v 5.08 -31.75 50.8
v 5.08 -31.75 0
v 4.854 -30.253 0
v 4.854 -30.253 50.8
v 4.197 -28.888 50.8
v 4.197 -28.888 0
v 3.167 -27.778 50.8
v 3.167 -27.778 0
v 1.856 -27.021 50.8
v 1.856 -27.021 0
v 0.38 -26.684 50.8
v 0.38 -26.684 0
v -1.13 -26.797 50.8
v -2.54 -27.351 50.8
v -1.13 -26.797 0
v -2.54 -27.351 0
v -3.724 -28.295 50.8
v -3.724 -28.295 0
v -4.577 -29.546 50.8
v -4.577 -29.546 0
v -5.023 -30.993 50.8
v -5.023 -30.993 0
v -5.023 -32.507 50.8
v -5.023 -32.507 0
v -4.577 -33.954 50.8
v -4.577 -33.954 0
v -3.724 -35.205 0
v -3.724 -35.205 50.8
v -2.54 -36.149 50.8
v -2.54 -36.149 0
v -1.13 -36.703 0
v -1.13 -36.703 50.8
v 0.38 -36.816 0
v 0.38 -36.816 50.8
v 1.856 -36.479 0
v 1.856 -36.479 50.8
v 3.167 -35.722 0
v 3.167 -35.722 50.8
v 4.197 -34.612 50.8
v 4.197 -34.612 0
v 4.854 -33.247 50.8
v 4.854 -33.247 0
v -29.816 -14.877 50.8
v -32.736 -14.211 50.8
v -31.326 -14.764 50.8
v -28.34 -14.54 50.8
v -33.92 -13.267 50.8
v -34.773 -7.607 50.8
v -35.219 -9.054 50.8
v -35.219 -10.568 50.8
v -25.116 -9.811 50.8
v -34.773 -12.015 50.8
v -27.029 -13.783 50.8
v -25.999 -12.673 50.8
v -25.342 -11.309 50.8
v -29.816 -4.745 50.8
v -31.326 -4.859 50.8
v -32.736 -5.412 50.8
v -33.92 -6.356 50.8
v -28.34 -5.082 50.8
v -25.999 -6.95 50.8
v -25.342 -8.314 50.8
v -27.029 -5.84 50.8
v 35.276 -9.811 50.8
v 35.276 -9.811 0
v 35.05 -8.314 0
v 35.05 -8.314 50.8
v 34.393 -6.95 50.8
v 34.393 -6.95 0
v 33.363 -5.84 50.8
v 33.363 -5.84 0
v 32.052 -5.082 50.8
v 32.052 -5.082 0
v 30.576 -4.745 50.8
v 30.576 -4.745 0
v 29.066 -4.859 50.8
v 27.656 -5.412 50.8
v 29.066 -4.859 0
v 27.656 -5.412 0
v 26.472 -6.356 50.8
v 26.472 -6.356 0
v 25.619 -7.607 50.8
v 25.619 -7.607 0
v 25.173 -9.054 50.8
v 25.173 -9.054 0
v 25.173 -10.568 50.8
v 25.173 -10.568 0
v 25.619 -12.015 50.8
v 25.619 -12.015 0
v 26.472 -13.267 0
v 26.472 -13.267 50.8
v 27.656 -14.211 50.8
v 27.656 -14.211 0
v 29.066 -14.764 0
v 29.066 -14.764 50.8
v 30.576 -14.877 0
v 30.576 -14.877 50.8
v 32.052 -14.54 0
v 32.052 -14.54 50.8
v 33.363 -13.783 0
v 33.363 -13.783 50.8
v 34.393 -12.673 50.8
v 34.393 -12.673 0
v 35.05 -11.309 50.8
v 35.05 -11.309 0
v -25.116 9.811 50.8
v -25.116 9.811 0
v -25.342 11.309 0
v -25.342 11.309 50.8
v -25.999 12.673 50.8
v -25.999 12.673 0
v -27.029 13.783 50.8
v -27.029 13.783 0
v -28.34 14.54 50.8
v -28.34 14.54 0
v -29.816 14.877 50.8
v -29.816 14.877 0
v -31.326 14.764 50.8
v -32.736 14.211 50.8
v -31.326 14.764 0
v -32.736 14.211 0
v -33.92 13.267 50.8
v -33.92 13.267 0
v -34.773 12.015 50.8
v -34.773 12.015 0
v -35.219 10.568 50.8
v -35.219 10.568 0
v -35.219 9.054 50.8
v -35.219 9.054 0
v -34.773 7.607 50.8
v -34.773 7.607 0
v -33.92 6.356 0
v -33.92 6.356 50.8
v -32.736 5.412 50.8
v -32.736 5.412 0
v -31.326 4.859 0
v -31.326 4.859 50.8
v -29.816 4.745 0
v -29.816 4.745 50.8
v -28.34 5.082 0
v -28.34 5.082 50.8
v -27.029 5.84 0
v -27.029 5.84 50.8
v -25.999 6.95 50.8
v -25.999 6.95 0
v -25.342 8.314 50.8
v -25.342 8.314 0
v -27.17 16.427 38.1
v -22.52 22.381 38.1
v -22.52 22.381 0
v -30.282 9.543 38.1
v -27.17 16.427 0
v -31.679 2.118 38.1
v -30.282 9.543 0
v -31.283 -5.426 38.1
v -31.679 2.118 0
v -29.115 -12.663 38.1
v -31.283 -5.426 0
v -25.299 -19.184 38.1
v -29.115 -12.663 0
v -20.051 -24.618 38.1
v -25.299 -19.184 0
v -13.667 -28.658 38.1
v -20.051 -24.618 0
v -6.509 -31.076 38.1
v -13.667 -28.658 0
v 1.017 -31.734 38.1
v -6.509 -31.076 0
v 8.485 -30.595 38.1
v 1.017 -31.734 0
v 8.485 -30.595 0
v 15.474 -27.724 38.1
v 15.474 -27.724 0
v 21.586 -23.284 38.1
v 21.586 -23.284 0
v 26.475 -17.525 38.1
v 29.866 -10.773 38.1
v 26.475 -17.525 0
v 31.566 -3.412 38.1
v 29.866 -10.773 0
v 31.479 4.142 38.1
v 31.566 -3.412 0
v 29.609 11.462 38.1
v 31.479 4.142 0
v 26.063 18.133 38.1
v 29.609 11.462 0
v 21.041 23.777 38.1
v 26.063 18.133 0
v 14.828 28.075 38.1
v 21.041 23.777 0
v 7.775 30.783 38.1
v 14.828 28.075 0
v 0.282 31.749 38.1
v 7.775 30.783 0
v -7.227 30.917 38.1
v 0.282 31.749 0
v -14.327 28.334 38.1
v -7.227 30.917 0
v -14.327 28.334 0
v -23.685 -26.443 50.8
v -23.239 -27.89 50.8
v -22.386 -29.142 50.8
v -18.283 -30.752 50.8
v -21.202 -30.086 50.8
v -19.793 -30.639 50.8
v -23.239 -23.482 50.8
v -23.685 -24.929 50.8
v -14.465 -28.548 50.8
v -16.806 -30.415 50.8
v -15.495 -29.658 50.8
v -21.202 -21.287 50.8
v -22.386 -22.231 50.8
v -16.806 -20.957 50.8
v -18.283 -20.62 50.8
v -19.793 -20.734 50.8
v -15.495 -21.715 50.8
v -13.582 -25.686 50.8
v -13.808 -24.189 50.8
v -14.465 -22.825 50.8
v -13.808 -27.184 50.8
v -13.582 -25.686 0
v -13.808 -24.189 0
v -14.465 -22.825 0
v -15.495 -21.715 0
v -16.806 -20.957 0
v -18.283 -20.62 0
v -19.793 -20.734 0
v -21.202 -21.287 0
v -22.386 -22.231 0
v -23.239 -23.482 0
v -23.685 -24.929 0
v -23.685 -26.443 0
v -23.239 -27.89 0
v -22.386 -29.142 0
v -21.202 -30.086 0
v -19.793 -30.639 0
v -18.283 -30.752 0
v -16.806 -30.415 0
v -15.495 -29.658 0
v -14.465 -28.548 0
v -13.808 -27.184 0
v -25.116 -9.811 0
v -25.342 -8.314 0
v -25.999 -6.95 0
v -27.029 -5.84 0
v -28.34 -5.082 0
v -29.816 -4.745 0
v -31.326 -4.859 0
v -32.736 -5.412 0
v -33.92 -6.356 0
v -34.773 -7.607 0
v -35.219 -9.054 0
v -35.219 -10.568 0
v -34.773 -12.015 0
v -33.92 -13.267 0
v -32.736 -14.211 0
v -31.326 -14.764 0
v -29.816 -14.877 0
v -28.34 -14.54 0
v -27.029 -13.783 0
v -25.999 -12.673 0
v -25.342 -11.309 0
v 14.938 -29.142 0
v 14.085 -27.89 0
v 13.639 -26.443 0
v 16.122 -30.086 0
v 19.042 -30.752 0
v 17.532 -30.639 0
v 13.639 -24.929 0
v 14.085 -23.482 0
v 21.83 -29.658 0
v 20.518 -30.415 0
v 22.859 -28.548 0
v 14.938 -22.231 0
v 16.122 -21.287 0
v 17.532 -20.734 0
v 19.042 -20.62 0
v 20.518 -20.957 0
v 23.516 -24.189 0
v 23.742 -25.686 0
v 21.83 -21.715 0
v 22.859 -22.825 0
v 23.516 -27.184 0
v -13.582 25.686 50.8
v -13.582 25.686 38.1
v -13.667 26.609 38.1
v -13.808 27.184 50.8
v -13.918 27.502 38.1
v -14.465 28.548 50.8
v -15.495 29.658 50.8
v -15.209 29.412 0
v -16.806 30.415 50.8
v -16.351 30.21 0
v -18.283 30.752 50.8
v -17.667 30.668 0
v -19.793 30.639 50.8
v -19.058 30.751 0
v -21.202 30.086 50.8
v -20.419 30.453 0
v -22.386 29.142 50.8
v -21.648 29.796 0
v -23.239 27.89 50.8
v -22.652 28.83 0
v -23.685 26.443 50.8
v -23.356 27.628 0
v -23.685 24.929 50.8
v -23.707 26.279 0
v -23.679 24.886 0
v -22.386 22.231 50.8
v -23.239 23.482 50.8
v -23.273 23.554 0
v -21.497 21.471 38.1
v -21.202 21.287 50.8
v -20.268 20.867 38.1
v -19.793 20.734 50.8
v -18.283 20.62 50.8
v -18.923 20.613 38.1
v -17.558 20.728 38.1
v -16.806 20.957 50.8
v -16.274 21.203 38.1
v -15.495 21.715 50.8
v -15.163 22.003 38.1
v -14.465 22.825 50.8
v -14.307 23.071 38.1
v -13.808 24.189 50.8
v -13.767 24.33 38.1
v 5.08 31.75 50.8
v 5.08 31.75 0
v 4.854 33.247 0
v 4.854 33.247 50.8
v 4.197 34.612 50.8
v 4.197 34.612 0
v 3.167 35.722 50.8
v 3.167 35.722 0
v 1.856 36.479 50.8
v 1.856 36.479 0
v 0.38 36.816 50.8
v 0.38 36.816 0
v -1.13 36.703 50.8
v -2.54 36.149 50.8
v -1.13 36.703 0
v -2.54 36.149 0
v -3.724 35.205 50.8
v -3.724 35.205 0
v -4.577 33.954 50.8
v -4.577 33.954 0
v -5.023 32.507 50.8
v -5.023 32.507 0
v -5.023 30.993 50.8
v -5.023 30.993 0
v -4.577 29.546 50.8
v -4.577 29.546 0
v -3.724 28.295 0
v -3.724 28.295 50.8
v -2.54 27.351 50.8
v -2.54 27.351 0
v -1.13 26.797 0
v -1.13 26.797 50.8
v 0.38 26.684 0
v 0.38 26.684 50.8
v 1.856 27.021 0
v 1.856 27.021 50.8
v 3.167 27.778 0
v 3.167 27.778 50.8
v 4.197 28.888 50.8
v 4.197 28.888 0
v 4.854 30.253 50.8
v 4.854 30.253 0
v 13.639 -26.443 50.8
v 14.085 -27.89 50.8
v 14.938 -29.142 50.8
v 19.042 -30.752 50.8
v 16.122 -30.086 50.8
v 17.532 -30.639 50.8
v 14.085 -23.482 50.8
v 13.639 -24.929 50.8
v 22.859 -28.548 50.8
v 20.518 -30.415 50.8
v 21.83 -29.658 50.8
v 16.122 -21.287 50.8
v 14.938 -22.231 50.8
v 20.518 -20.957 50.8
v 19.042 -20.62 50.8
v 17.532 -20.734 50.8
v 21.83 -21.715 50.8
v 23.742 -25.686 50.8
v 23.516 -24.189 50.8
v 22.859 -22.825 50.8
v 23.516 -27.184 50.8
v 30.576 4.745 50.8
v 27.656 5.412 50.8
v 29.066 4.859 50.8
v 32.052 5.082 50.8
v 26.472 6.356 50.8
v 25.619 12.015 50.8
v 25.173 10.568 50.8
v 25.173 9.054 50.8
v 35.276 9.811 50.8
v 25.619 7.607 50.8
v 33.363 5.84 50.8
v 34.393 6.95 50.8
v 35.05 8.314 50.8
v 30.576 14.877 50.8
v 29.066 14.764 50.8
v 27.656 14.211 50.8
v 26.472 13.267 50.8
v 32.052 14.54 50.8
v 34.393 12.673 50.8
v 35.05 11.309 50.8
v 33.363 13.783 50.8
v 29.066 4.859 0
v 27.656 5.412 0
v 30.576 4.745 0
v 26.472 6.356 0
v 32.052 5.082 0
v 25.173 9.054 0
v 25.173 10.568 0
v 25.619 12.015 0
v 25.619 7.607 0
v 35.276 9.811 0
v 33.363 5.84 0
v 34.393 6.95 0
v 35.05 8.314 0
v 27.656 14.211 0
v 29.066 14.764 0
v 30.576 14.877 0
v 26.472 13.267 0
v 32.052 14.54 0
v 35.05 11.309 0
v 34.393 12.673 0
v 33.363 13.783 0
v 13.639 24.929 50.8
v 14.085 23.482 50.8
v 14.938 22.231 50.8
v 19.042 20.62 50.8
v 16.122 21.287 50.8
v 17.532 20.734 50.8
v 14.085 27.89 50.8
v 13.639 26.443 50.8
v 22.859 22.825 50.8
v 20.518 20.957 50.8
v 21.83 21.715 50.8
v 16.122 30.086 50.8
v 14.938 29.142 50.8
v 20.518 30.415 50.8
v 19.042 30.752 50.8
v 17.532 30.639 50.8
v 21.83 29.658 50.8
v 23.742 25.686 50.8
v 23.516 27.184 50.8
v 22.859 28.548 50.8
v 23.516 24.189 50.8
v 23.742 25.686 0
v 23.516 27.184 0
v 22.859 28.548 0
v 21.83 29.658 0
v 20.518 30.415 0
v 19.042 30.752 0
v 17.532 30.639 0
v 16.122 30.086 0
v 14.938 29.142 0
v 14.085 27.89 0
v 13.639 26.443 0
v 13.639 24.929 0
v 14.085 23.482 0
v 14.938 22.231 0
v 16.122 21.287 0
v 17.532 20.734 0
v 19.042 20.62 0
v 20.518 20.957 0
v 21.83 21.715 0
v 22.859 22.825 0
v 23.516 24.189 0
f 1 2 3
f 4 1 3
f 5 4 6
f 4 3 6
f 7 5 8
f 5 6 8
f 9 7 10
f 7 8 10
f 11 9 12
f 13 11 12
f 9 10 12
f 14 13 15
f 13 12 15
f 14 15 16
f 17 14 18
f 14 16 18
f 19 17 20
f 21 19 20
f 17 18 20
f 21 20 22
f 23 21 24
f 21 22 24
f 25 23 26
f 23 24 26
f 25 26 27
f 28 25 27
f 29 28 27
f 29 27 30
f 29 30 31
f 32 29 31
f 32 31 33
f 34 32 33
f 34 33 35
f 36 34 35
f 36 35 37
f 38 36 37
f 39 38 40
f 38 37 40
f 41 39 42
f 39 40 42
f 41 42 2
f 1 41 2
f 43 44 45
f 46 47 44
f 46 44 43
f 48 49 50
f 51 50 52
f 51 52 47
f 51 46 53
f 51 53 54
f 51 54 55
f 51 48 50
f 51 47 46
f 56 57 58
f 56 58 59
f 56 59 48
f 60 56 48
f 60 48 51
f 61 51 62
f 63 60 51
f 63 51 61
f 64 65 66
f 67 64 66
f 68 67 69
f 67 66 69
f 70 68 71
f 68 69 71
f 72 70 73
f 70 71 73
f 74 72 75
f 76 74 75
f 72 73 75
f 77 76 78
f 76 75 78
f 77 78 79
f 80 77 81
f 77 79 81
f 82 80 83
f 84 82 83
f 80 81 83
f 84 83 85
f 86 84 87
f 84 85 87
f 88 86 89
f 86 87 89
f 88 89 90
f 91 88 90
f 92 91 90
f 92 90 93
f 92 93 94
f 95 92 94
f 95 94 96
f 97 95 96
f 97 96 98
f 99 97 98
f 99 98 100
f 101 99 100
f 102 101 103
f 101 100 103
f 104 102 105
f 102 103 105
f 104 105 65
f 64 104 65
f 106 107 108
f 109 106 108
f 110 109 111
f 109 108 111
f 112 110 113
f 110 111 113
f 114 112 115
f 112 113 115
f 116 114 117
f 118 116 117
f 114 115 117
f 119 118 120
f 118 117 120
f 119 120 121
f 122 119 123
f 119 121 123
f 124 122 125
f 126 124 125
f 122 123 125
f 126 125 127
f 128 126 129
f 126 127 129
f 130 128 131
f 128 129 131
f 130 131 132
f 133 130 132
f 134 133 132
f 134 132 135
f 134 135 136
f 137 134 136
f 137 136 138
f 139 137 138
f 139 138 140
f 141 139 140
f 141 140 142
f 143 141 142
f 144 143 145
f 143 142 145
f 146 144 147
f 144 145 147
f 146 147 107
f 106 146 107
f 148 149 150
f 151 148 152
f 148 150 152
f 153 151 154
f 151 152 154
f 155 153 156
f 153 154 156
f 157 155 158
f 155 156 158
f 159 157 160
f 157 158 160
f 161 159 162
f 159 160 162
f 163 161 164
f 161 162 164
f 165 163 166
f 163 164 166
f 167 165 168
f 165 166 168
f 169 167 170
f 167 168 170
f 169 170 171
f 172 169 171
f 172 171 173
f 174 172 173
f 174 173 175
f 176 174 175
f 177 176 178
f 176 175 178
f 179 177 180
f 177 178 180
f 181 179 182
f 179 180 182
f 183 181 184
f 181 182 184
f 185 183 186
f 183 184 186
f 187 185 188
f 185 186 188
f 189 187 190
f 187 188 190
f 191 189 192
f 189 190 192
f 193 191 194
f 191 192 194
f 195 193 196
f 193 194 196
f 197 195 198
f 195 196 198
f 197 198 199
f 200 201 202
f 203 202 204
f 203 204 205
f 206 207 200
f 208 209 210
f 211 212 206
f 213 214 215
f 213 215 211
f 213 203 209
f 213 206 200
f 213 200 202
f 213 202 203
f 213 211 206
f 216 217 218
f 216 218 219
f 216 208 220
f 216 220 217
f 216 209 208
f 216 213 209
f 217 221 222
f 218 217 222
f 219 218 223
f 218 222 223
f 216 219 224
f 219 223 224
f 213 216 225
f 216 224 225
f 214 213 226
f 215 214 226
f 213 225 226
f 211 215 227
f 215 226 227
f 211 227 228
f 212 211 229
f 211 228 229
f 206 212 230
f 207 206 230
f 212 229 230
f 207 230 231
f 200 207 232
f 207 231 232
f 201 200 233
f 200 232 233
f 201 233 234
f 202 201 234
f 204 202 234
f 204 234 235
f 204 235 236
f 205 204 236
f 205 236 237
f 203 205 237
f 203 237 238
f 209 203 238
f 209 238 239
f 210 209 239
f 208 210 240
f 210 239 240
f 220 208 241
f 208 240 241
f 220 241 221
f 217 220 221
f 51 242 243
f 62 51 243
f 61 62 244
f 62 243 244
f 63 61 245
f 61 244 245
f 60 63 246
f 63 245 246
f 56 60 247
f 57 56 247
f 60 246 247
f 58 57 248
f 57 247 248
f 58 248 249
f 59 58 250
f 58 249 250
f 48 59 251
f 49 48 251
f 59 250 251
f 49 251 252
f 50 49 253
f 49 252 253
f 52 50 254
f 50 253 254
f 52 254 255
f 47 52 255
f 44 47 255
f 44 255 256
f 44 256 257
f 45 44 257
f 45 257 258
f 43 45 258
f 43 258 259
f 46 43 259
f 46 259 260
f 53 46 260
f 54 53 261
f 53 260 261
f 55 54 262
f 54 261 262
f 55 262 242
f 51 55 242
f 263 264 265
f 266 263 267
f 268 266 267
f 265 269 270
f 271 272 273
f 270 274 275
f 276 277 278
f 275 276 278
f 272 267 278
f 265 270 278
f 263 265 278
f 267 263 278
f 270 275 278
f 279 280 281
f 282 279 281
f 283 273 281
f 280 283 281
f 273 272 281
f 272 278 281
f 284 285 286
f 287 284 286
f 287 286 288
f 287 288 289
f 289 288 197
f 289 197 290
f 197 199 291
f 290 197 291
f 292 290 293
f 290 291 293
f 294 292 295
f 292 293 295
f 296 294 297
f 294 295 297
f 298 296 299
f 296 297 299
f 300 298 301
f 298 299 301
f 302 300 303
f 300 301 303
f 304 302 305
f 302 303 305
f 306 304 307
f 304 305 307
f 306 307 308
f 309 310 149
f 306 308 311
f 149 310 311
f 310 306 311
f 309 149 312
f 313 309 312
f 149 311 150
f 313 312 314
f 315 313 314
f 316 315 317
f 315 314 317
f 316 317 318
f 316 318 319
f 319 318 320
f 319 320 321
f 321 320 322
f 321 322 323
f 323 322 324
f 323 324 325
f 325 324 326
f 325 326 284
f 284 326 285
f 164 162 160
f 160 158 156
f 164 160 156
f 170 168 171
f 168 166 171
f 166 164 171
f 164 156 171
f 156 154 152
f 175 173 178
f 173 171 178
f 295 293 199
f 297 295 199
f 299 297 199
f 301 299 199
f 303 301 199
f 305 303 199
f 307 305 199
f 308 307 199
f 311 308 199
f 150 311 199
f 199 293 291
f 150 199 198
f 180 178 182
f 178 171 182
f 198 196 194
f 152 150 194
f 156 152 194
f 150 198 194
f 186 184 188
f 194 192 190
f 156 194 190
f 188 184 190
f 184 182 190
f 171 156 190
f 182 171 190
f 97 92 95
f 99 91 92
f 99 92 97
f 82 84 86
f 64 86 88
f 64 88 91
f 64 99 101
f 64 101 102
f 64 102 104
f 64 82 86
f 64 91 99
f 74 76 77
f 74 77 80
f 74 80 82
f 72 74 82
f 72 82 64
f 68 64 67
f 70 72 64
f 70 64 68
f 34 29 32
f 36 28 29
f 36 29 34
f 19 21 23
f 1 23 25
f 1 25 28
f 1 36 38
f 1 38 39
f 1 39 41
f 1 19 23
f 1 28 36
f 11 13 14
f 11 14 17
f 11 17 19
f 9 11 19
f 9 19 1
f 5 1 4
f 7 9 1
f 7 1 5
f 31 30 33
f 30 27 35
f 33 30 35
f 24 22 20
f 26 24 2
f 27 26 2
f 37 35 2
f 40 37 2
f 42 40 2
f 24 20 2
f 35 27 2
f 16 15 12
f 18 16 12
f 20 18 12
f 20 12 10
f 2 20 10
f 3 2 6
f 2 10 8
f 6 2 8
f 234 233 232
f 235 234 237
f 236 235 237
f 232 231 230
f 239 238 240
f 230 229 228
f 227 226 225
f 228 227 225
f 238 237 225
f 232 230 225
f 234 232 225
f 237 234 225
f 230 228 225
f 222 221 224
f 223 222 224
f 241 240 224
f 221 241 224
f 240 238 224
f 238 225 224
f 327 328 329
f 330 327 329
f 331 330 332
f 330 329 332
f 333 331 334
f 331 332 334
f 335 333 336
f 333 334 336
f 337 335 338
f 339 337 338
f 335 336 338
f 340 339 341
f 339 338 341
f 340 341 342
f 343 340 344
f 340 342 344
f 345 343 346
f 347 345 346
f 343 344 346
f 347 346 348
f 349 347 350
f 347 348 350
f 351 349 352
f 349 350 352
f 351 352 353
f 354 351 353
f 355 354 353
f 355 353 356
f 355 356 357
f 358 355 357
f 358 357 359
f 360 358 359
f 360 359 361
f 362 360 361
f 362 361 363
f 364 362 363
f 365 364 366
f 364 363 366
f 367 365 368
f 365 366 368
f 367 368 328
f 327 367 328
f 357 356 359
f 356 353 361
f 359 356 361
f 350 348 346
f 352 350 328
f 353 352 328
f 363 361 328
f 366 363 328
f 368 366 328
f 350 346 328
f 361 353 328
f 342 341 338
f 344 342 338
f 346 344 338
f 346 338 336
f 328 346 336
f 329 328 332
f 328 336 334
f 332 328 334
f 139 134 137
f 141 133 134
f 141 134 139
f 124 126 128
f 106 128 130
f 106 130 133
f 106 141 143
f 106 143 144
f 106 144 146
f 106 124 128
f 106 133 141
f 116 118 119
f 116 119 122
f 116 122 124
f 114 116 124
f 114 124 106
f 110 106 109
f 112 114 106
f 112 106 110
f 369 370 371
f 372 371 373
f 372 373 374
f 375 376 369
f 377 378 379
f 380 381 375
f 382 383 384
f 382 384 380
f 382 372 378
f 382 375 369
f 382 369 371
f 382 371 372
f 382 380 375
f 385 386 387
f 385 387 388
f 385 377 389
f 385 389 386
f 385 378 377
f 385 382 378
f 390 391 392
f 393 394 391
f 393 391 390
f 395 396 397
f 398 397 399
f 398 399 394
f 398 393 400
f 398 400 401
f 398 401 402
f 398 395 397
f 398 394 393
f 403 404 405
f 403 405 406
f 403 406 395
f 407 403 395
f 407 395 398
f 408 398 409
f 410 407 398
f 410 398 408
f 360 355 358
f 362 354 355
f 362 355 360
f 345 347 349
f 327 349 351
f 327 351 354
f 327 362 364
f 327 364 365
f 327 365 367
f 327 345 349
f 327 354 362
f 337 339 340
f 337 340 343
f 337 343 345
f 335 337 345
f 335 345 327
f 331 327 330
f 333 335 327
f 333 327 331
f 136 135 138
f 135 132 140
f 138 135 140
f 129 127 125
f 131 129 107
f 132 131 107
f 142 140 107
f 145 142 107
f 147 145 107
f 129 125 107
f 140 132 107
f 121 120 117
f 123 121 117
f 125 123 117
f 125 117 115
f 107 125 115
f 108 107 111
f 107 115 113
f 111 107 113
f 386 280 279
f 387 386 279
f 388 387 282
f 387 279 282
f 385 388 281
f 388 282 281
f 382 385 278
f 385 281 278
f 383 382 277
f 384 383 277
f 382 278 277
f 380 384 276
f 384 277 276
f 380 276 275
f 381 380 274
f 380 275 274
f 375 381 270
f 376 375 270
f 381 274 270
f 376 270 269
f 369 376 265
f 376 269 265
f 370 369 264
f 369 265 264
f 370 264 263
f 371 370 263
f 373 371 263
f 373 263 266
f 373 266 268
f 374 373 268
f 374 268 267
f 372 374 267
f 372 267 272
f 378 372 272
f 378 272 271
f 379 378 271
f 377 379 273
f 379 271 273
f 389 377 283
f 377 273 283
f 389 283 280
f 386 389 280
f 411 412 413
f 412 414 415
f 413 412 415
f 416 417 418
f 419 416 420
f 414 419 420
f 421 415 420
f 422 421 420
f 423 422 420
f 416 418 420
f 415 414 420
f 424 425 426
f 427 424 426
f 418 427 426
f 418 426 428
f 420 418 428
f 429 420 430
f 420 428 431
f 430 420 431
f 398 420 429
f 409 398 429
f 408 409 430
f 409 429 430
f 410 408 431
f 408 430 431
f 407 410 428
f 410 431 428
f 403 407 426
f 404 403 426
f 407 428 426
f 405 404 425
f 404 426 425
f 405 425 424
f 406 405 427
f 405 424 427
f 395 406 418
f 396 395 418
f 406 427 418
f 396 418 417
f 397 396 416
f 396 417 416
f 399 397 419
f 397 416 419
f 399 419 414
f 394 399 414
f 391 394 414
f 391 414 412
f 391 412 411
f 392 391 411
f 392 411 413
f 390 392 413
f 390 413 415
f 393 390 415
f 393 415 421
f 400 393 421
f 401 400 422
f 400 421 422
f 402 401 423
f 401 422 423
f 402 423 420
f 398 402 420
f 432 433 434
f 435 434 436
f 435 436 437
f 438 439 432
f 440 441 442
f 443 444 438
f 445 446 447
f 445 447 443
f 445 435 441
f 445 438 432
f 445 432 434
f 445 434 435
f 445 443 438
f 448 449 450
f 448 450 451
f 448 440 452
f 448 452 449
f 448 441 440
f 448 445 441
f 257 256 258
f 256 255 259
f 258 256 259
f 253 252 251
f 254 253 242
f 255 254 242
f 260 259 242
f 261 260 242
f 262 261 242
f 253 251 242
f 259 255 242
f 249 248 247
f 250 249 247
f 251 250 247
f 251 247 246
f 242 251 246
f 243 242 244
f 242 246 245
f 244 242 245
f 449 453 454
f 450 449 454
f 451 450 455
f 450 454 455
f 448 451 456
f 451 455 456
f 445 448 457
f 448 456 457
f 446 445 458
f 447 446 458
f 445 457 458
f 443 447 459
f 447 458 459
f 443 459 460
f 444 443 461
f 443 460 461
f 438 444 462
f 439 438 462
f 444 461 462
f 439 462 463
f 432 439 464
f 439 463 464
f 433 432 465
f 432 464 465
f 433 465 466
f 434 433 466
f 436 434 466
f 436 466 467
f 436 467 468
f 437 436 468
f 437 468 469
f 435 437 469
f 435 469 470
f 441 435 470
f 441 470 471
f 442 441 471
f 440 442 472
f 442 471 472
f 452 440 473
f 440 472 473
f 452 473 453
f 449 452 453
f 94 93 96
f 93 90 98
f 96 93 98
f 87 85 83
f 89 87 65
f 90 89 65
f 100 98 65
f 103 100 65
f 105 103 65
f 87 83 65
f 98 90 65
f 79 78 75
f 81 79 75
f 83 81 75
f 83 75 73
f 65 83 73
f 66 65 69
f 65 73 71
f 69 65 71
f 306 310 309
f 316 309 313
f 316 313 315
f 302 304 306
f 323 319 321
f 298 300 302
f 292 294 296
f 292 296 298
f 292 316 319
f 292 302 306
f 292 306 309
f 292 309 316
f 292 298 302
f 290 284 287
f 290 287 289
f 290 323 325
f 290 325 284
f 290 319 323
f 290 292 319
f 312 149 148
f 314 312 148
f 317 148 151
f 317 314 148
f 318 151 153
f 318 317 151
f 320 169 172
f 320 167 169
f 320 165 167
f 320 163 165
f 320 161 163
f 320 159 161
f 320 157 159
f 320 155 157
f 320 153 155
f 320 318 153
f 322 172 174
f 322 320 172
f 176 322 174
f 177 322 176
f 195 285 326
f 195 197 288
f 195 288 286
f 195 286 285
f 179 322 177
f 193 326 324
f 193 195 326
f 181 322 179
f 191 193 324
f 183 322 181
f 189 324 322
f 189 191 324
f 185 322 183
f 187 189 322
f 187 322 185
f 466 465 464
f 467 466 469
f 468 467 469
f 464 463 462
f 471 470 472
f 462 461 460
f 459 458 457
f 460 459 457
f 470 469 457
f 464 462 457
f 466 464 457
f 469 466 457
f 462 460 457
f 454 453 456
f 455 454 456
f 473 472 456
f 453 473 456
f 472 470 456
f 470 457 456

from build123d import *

# Parameters (mm, degrees)
F0_R     = 31.75
F1_DEPTH = 38.1
F2_R     = 5.08
F3_DEPTH = 50.8


with BuildPart() as f1:
    # F0 (on Top) → F1 (new body)
    with BuildSketch(Plane.XY):
        Circle(F0_R)
    extrude(amount=F1_DEPTH)

    # F2 (on Top) → F3, piece 2 (join)
    with BuildSketch(Plane.XY):
        with Locations((-18.6621817603, 25.6862895714)):
            Circle(F2_R)
    extrude(amount=F3_DEPTH)


with BuildPart() as f3:
    # F2 (on Top) → F3 (new body)
    with BuildSketch(Plane.XY):
        with Locations((0, 31.75)):
            Circle(F2_R)
    extrude(amount=F3_DEPTH)


with BuildPart() as f3b:
    # F2 (on Top) → F3, piece 3 (new body)
    with BuildSketch(Plane.XY):
        with Locations((-30.1960443924, 9.8112895714)):
            Circle(F2_R)
    extrude(amount=F3_DEPTH)


with BuildPart() as f3c:
    # F2 (on Top) → F3, piece 4 (new body)
    with BuildSketch(Plane.XY):
        with Locations((-30.1960443924, -9.8112895714)):
            Circle(F2_R)
    extrude(amount=F3_DEPTH)


with BuildPart() as f3d:
    # F2 (on Top) → F3, piece 5 (new body)
    with BuildSketch(Plane.XY):
        with Locations((-18.6621817603, -25.6862895714)):
            Circle(F2_R)
    extrude(amount=F3_DEPTH)


with BuildPart() as f3e:
    # F2 (on Top) → F3, piece 6 (new body)
    with BuildSketch(Plane.XY):
        with Locations((0, -31.75)):
            Circle(F2_R)
    extrude(amount=F3_DEPTH)


with BuildPart() as f3f:
    # F2 (on Top) → F3, piece 7 (new body)
    with BuildSketch(Plane.XY):
        with Locations((18.6621817603, -25.6862895714)):
            Circle(F2_R)
    extrude(amount=F3_DEPTH)


with BuildPart() as f3g:
    # F2 (on Top) → F3, piece 8 (new body)
    with BuildSketch(Plane.XY):
        with Locations((30.1960443924, -9.8112895714)):
            Circle(F2_R)
    extrude(amount=F3_DEPTH)


with BuildPart() as f3h:
    # F2 (on Top) → F3, piece 9 (new body)
    with BuildSketch(Plane.XY):
        with Locations((30.1960443924, 9.8112895714)):
            Circle(F2_R)
    extrude(amount=F3_DEPTH)


with BuildPart() as f3i:
    # F2 (on Top) → F3, piece 10 (new body)
    with BuildSketch(Plane.XY):
        with Locations((18.6621817603, 25.6862895714)):
            Circle(F2_R)
    extrude(amount=F3_DEPTH)


solid = Compound([f1.part, f3.part, f3b.part, f3c.part, f3d.part, f3e.part, f3f.part, f3g.part, f3h.part, f3i.part])
